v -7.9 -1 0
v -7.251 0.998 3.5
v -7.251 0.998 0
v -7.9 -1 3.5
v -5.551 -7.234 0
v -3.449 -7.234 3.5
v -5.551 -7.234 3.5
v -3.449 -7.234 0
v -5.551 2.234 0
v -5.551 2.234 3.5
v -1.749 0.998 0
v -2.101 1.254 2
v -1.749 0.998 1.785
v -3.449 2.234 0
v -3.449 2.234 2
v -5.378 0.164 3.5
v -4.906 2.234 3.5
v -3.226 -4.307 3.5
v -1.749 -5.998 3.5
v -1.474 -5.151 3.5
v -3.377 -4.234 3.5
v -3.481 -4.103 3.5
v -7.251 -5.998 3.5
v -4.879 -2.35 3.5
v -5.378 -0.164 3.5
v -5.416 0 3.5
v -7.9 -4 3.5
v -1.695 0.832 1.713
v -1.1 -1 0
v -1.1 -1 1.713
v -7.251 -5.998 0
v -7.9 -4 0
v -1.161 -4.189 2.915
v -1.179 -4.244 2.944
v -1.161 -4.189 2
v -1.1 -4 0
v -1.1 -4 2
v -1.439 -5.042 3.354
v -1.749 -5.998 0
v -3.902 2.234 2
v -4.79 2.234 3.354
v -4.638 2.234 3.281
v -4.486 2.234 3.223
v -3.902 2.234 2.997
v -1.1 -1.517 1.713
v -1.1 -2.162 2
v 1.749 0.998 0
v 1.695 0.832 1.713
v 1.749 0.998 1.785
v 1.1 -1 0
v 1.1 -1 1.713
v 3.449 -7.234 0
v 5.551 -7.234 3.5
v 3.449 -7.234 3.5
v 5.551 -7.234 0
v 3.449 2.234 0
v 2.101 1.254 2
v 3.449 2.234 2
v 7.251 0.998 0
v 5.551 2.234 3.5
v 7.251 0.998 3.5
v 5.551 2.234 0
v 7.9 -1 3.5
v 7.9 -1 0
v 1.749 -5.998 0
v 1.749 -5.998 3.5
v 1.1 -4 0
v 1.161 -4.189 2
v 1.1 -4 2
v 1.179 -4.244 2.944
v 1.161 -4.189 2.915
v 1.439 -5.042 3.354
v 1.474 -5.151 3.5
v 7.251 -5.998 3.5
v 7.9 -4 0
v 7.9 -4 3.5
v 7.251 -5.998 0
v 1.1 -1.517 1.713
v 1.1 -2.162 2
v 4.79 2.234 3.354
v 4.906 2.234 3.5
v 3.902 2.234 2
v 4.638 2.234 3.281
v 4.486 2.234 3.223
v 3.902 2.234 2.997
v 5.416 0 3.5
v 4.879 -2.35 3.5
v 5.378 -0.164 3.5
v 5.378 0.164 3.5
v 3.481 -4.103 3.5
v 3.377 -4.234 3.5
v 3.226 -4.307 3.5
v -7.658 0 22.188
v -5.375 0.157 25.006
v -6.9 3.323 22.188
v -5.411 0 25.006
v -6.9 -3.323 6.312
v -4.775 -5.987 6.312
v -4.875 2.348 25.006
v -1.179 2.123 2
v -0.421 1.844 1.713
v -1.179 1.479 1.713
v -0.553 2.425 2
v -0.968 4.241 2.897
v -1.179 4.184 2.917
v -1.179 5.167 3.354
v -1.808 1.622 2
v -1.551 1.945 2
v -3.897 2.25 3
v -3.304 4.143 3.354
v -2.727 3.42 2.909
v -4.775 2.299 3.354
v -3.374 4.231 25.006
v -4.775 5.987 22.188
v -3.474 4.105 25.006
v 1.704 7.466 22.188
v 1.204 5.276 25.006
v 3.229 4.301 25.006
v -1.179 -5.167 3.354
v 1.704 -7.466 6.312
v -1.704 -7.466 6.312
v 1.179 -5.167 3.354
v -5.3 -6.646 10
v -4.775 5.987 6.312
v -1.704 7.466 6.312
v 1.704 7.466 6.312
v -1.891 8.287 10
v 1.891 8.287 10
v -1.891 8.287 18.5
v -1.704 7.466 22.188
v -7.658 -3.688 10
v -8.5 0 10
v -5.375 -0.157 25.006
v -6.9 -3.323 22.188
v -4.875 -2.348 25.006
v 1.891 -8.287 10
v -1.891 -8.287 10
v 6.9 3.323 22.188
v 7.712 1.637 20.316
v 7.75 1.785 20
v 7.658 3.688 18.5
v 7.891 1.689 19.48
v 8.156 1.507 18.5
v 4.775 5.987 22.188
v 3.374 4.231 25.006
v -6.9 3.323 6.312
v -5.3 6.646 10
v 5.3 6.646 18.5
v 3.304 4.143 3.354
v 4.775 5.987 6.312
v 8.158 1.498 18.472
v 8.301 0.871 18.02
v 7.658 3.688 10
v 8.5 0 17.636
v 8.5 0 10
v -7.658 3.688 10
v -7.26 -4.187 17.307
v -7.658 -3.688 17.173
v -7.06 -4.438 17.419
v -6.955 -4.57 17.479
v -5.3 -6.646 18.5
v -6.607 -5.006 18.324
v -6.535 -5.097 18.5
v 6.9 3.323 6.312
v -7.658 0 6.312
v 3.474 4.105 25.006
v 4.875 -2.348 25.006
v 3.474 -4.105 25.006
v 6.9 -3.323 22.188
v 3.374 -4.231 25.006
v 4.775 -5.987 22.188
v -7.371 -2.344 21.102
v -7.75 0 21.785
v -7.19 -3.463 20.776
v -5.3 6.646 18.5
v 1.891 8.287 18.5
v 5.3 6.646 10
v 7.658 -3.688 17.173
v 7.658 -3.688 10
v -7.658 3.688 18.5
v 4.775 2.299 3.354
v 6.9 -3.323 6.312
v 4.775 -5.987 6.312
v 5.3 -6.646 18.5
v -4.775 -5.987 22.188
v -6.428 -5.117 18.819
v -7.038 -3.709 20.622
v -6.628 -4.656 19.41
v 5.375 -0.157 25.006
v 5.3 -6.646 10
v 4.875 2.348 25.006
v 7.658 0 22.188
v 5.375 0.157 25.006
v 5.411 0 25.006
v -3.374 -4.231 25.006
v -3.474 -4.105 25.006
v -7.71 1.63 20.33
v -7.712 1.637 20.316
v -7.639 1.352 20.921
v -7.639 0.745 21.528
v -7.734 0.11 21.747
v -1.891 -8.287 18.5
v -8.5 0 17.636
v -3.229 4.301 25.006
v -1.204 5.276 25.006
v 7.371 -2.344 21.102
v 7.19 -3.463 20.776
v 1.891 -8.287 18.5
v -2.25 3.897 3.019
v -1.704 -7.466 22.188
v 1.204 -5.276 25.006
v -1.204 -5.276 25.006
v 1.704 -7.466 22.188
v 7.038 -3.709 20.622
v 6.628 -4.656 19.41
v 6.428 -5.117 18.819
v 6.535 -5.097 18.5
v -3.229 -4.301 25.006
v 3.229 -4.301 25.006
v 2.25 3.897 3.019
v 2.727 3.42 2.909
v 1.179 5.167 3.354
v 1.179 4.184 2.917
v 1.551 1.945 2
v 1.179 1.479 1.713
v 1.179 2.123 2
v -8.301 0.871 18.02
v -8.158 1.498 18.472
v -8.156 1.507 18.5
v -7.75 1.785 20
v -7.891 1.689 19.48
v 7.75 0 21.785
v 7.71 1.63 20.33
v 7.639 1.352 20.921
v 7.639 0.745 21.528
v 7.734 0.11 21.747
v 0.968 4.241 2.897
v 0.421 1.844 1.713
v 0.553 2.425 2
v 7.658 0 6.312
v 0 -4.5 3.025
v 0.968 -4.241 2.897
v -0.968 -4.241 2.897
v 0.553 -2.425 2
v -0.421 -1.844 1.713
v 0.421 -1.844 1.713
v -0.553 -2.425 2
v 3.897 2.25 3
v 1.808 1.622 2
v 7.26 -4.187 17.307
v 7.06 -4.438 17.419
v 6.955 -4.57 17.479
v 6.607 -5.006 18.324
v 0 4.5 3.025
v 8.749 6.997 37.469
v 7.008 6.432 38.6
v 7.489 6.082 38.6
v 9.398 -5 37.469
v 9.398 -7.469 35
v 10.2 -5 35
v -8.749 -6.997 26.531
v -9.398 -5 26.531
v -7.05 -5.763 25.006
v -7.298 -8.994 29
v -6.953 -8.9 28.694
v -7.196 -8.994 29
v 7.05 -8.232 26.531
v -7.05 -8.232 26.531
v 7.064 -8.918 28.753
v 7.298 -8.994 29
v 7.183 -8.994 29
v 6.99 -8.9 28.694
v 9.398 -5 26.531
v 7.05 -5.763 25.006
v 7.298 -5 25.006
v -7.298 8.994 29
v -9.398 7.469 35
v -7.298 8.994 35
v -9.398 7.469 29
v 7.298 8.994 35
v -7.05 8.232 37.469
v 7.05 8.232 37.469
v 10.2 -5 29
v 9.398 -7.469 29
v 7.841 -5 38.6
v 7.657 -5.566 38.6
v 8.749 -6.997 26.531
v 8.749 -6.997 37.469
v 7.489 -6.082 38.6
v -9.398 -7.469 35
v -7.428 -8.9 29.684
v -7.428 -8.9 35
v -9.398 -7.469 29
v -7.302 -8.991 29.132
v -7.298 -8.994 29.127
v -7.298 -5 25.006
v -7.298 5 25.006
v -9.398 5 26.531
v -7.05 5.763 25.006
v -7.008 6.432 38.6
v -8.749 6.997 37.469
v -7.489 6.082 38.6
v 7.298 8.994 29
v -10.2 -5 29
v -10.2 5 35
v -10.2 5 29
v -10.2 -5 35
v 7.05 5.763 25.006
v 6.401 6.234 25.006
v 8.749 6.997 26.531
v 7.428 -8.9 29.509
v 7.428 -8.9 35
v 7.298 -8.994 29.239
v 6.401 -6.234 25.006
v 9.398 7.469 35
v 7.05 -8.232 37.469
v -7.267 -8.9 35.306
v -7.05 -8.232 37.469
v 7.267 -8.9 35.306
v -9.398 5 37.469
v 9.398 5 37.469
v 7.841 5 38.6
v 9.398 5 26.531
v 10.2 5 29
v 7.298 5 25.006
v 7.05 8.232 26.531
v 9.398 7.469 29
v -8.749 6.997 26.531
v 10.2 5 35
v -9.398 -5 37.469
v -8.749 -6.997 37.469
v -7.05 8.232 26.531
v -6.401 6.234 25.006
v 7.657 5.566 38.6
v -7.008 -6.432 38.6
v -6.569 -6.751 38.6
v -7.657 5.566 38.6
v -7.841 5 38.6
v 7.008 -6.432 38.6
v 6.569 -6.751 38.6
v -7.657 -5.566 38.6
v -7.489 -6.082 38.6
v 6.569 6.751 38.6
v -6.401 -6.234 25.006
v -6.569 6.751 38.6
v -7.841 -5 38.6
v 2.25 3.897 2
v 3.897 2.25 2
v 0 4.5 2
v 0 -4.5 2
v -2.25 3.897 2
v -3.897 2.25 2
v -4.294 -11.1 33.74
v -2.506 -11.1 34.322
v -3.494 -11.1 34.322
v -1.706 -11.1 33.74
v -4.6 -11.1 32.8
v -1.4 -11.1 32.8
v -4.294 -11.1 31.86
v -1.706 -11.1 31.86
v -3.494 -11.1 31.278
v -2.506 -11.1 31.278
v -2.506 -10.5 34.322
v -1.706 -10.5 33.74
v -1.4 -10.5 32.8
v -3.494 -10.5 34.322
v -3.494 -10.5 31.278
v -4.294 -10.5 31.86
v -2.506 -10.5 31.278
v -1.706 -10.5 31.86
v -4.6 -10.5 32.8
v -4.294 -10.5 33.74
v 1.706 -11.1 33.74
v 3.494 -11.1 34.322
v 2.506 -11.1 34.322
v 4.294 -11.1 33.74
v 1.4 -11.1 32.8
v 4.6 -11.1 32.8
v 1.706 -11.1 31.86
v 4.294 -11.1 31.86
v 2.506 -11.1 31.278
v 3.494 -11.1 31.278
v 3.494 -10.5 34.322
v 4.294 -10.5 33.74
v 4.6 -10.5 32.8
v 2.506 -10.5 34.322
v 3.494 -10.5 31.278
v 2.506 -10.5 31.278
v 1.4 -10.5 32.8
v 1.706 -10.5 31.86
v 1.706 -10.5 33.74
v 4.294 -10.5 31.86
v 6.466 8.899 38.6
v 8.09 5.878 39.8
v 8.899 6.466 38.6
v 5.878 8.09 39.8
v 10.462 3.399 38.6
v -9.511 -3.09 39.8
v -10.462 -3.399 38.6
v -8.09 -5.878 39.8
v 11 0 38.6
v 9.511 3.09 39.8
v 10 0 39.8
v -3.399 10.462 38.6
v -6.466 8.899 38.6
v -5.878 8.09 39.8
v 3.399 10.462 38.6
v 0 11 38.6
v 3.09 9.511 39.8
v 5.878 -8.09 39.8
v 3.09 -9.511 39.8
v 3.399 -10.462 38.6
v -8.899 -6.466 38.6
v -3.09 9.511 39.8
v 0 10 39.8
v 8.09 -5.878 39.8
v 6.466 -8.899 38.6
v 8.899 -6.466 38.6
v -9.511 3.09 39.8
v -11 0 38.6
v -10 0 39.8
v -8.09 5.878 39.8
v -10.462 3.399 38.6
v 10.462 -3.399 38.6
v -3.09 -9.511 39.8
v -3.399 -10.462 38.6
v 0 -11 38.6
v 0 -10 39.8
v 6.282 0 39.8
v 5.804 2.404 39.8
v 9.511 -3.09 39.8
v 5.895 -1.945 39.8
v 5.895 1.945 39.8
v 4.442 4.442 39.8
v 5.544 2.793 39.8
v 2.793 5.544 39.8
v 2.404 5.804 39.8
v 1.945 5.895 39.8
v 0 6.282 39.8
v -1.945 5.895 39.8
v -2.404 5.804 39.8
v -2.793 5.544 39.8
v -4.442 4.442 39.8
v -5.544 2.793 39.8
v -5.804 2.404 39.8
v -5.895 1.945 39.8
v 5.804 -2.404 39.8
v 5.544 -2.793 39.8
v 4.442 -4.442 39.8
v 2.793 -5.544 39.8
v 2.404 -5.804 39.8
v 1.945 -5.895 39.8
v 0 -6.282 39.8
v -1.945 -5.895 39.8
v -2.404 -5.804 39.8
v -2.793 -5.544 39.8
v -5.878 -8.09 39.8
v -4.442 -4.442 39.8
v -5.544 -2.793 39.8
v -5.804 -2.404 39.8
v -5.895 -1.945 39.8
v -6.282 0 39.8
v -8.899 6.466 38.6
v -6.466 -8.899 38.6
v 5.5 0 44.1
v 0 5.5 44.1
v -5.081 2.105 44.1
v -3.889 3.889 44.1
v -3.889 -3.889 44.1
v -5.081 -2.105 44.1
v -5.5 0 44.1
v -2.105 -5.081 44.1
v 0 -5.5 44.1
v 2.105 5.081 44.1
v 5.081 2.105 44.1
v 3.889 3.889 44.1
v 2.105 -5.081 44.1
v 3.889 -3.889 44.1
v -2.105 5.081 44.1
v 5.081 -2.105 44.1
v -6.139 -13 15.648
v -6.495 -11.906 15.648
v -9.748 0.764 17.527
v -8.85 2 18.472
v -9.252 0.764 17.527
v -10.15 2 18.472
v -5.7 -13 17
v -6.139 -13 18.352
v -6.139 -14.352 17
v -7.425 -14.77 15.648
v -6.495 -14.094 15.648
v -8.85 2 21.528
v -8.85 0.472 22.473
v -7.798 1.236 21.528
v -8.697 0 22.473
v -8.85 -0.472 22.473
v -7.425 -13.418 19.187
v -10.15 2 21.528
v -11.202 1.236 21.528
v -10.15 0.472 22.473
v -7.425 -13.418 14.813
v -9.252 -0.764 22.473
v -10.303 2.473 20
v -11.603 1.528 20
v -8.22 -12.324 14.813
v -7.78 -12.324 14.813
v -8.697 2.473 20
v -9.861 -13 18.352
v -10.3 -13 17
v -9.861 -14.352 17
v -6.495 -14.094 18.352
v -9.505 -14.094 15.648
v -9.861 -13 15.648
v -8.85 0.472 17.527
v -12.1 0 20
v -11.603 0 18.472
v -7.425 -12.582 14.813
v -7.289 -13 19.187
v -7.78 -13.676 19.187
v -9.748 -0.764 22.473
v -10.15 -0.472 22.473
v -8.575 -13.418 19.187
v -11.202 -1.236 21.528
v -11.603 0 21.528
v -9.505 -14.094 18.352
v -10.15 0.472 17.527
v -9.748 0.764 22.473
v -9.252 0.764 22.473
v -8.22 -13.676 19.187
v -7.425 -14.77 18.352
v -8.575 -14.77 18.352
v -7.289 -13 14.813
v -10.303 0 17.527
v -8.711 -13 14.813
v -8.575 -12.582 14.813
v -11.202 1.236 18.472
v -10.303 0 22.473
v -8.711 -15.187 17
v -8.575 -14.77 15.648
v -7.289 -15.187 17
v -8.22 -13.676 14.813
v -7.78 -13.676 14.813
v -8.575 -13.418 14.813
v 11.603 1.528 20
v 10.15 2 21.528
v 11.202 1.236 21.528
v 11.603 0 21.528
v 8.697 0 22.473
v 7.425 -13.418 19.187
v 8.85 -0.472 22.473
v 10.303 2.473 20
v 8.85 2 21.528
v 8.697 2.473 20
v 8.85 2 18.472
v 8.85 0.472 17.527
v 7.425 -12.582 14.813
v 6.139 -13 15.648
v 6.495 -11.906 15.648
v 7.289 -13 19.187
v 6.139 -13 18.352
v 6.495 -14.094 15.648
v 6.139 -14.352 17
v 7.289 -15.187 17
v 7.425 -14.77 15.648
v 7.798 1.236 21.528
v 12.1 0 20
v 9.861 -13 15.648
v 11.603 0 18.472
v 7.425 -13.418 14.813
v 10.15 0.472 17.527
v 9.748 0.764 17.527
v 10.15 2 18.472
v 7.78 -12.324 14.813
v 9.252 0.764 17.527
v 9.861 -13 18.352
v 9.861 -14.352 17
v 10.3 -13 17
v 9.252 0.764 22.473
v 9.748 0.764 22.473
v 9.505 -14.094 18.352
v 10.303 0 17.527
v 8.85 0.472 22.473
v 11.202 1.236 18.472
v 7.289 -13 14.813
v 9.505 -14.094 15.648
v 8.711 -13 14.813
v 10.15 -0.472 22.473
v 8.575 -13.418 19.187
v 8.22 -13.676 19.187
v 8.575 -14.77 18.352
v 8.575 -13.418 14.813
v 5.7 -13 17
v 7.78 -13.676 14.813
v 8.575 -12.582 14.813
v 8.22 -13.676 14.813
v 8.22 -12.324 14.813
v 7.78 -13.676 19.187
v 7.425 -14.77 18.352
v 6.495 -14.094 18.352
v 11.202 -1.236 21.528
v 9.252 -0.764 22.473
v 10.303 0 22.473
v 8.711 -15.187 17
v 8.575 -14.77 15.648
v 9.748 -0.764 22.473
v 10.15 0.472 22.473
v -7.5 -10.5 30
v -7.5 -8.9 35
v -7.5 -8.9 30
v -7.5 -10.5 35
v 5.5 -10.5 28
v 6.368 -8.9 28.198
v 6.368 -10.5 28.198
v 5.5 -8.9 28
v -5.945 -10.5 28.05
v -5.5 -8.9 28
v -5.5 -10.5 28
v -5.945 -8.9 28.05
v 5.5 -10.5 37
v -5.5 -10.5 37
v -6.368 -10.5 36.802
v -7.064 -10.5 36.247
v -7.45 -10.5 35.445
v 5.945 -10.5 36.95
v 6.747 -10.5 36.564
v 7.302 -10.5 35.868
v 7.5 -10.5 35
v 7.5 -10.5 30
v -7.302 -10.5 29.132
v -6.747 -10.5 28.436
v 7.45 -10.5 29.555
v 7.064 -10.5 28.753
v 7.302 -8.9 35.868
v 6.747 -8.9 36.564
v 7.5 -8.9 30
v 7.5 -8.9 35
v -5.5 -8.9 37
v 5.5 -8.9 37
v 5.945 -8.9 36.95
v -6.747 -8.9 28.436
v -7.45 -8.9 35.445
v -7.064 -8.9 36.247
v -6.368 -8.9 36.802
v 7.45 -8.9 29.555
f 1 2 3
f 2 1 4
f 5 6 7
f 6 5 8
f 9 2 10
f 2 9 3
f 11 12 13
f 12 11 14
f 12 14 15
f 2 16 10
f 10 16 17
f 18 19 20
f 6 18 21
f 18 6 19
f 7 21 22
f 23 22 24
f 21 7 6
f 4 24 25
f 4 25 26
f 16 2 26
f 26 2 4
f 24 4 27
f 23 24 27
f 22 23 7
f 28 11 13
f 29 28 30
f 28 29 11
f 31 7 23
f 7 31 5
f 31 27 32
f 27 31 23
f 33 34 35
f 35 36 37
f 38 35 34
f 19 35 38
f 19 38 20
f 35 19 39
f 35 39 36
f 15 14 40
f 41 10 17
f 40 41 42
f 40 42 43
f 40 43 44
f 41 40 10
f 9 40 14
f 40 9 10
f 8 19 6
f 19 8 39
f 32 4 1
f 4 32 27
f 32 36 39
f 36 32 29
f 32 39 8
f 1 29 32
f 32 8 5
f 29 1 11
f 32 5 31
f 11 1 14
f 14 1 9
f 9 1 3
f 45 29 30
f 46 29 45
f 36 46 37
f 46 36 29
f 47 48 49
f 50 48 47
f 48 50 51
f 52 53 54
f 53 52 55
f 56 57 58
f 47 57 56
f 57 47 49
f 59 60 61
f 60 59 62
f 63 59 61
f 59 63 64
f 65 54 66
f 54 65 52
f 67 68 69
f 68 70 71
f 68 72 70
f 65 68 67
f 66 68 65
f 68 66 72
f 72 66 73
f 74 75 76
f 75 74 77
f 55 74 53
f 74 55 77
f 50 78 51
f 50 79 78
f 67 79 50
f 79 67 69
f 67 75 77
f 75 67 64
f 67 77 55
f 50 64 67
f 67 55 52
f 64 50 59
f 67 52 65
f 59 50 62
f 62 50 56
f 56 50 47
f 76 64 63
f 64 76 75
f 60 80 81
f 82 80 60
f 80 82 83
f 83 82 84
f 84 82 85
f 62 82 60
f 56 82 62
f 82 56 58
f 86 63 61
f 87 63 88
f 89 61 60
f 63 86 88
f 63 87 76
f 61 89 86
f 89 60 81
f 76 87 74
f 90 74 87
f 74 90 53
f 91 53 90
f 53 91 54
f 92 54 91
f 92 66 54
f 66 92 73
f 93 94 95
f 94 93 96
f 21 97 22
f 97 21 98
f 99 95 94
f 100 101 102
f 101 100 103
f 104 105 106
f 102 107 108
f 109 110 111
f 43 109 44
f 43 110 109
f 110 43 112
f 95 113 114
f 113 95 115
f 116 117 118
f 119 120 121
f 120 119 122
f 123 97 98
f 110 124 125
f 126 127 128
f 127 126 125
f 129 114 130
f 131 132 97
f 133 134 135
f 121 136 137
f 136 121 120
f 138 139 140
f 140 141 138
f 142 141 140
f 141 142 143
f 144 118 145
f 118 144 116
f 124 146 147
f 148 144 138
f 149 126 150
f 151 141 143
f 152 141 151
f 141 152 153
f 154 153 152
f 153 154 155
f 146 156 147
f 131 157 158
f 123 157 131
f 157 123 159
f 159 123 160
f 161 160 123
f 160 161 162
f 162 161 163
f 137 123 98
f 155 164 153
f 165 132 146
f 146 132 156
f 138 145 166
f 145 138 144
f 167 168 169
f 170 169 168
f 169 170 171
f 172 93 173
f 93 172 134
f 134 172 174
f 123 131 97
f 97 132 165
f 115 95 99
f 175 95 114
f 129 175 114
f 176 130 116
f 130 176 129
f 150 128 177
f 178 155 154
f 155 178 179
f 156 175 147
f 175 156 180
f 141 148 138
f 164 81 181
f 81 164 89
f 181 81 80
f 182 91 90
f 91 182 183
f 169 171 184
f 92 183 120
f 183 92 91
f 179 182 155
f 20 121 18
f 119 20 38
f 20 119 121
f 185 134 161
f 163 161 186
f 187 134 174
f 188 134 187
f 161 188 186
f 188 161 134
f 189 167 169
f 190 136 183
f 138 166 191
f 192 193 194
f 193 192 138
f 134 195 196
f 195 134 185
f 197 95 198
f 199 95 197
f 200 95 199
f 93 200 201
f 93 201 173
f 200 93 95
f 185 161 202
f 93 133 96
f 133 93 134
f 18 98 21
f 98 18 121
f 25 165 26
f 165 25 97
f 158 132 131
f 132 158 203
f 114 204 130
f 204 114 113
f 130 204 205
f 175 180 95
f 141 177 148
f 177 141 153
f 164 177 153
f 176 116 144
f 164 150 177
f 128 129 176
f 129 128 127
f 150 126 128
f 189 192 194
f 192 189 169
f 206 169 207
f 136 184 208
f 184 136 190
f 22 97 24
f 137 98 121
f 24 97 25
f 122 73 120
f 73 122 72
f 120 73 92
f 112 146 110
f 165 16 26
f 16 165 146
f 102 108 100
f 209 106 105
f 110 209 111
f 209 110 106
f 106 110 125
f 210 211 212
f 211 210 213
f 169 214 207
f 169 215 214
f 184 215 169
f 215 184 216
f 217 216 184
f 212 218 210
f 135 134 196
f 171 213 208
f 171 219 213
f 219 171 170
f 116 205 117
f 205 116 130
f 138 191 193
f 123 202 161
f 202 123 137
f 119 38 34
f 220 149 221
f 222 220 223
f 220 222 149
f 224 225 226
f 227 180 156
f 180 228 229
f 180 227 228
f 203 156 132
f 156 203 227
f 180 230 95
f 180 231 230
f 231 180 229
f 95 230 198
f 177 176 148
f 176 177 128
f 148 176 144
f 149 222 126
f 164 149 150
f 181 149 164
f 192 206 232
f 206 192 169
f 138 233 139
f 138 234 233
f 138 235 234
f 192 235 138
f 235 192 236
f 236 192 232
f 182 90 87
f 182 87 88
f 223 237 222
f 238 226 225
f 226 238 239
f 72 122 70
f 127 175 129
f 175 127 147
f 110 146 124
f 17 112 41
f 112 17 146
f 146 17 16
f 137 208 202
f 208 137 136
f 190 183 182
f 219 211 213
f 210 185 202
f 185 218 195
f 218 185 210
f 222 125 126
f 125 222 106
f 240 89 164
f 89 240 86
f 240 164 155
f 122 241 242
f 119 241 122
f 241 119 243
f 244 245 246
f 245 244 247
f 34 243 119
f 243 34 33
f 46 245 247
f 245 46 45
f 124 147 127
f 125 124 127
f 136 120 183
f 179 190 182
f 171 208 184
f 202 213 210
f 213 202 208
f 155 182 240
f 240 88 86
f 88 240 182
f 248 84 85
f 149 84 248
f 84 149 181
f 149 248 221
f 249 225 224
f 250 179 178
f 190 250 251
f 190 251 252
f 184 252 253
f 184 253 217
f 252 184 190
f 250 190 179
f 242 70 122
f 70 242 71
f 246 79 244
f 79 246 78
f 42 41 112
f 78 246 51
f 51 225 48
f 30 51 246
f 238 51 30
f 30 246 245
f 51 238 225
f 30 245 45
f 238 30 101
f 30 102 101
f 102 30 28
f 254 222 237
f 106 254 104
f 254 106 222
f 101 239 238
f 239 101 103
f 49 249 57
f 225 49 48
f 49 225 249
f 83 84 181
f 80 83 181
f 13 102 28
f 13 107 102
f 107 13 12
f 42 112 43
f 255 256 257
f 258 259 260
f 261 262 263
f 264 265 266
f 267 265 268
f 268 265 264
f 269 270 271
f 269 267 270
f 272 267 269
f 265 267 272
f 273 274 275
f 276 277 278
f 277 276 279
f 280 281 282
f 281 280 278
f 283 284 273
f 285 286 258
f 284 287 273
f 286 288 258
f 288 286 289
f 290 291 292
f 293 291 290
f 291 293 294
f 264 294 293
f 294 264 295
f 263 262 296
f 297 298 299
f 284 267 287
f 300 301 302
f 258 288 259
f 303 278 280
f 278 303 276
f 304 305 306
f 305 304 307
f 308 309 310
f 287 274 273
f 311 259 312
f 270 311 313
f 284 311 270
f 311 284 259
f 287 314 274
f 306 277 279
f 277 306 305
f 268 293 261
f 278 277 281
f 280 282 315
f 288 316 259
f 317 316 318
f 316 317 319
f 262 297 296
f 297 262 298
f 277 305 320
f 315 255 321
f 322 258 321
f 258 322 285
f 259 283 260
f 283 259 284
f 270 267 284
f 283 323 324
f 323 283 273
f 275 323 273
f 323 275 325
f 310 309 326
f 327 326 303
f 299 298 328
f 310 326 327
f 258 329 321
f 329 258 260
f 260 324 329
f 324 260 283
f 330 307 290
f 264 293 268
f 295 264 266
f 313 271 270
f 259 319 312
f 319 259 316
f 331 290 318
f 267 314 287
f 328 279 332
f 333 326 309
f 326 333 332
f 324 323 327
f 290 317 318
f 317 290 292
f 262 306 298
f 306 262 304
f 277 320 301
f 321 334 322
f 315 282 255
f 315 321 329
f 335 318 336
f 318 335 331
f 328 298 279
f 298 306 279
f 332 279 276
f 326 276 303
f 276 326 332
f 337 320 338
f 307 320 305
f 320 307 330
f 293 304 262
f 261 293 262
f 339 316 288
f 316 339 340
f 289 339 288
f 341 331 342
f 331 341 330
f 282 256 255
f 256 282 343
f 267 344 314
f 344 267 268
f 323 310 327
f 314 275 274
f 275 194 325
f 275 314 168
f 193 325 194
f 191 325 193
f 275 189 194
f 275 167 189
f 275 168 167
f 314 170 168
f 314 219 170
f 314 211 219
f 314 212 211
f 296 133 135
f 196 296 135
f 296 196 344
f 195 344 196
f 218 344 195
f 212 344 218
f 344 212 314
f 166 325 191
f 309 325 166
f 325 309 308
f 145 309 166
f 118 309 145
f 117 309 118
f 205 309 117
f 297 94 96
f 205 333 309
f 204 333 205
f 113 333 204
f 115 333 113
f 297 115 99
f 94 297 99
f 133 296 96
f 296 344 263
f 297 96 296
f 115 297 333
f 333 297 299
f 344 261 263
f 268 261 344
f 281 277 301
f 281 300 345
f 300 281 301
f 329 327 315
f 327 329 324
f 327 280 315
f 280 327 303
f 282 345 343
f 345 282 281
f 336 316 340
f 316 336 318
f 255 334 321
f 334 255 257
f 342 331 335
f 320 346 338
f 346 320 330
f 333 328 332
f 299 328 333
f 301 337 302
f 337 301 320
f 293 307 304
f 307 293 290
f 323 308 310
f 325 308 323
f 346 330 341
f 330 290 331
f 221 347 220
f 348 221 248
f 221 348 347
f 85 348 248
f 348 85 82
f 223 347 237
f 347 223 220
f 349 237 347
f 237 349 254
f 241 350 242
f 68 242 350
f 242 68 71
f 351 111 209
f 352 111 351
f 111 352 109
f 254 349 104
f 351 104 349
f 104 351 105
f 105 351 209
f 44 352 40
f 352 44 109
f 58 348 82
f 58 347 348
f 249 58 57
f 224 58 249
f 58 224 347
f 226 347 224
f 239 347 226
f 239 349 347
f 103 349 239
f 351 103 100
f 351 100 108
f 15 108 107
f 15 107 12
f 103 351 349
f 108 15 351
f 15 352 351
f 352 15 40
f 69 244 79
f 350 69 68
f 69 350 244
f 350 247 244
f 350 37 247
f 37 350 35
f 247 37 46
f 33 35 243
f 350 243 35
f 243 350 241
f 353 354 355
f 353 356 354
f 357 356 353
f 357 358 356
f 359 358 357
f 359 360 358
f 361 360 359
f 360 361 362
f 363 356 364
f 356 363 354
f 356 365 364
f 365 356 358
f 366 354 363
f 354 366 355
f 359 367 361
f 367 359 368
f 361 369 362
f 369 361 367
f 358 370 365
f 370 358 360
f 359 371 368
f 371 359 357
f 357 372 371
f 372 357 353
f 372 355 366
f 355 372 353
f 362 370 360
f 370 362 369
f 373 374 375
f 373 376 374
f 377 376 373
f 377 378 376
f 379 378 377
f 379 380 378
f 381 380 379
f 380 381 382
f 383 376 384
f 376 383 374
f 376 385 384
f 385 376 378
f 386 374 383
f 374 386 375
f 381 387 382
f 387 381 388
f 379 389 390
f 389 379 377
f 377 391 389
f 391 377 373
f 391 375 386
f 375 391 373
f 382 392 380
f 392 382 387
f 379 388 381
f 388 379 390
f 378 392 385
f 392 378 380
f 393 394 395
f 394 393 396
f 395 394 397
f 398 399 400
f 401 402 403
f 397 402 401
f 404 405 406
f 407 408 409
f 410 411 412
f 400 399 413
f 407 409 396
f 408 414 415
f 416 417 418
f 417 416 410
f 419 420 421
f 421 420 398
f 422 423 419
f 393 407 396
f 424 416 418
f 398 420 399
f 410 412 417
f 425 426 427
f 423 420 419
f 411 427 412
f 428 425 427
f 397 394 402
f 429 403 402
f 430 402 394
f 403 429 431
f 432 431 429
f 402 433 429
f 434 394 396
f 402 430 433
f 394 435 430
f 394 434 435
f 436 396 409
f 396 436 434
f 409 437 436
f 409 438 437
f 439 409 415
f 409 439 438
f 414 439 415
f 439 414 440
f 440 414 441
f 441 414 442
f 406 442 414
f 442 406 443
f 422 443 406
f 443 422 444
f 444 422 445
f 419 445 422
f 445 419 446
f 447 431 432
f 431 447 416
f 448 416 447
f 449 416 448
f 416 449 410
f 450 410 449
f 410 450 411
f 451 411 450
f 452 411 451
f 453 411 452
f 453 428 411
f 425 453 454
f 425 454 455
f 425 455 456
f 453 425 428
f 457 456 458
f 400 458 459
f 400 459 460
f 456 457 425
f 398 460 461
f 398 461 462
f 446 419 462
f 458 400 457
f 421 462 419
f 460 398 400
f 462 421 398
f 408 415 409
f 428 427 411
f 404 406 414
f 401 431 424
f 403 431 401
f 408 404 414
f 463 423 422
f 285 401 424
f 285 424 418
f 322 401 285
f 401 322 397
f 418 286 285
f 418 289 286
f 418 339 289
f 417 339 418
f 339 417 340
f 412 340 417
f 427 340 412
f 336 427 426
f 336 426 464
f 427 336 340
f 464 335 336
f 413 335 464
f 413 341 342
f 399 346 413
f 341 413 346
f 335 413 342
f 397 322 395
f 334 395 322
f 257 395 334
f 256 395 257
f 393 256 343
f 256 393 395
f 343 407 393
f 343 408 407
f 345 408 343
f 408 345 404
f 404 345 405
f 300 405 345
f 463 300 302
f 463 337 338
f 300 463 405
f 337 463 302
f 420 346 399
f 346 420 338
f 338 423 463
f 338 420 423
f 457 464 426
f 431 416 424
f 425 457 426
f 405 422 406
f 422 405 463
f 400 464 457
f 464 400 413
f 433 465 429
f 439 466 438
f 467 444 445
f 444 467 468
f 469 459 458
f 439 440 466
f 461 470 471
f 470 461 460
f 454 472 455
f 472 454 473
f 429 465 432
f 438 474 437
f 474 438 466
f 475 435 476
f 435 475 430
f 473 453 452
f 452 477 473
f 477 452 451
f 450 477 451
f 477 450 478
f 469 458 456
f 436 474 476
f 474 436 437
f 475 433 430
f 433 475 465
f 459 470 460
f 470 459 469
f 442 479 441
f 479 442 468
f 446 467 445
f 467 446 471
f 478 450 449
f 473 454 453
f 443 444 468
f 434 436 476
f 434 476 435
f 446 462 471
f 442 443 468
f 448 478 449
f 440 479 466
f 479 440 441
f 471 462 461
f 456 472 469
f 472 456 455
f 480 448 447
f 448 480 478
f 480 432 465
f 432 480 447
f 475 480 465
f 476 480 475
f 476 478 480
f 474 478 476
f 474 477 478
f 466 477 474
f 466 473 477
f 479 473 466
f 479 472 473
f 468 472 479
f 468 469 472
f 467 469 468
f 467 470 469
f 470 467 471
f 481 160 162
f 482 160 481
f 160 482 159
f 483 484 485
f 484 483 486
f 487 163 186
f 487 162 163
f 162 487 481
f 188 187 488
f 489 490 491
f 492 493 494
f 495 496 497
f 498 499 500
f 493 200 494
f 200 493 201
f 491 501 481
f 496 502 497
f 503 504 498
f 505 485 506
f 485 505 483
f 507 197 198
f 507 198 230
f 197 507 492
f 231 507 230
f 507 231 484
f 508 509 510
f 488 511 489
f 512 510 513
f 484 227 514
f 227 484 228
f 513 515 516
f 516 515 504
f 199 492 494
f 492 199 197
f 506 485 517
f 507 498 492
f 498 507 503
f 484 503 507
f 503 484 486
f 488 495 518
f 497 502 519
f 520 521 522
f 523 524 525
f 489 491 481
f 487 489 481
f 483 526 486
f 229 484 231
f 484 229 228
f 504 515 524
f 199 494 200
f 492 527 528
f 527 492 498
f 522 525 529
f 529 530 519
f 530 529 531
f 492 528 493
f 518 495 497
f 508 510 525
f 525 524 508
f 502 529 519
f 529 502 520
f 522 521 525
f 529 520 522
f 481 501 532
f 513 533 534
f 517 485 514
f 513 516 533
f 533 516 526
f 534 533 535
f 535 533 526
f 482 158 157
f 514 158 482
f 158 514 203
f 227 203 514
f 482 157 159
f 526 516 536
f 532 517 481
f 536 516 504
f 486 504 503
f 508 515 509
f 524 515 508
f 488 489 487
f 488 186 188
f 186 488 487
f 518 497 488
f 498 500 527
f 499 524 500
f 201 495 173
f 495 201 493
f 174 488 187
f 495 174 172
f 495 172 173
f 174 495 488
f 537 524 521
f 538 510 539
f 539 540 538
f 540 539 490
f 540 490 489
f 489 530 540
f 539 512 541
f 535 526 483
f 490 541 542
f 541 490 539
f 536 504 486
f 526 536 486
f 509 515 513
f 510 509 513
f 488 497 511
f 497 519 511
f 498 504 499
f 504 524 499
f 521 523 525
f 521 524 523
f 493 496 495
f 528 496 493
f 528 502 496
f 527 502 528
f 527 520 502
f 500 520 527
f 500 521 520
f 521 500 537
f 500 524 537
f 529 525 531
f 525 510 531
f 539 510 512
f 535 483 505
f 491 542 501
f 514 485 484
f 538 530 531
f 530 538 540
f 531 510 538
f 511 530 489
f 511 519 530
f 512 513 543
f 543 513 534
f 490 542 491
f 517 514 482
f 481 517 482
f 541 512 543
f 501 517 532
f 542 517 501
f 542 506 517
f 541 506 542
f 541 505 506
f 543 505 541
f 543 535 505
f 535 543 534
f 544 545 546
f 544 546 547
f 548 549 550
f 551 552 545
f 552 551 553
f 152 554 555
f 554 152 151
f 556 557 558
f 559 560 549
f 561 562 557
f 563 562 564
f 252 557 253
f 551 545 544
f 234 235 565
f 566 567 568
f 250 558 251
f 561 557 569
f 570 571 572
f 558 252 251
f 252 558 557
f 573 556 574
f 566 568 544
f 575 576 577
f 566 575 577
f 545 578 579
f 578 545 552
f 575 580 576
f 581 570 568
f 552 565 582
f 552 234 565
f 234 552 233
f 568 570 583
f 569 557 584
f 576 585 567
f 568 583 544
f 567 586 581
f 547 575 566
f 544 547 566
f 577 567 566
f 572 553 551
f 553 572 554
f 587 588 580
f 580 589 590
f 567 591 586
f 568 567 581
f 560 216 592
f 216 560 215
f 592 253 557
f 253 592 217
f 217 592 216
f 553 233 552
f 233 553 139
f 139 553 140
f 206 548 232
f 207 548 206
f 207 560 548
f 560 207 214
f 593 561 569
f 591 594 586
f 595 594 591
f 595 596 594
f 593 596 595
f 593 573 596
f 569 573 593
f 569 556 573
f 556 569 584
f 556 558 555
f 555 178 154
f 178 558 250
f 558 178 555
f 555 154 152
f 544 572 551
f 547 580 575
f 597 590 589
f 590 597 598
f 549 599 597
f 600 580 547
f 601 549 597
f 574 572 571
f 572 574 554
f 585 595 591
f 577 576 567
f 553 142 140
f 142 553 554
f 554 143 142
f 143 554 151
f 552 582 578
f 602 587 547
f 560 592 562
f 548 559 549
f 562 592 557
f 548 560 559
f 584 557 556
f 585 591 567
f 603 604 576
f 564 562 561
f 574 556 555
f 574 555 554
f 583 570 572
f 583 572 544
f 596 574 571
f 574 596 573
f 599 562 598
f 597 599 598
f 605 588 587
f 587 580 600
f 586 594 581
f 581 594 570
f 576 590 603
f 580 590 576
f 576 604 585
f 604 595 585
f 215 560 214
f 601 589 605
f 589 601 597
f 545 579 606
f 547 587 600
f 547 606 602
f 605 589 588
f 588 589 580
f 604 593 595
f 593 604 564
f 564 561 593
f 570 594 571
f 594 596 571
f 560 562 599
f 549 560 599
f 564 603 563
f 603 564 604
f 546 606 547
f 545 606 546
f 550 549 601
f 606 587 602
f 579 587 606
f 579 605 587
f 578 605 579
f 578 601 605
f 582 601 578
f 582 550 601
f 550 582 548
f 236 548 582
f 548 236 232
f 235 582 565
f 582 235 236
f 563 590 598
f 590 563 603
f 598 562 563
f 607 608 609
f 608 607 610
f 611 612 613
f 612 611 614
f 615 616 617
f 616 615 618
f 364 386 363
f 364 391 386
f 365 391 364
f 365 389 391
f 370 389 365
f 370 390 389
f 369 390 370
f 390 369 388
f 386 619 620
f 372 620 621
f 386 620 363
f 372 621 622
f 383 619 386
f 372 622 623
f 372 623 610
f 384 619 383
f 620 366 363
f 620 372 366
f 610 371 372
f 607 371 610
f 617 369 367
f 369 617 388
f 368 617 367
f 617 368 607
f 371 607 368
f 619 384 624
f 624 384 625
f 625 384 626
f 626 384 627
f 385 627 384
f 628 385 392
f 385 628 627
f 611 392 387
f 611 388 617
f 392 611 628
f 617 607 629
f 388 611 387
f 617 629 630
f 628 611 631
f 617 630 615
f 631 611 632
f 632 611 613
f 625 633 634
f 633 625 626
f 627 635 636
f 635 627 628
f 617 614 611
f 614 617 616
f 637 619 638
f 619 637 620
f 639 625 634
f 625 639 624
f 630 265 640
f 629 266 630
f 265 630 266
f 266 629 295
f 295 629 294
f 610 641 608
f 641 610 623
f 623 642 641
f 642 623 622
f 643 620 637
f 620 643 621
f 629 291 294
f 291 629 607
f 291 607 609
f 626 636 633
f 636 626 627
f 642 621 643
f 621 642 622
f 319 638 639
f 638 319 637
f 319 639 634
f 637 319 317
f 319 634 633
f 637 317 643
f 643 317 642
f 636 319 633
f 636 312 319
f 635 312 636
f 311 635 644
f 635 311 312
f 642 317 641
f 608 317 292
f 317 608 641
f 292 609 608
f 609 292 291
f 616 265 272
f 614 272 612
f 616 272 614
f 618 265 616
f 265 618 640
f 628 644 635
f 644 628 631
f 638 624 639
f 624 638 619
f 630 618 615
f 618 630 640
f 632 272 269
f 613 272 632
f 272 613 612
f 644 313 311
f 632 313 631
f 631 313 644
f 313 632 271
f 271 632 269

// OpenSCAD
// Kiuê — robozinho articulado (tema fazenda), v1.
// Família dos robôs dos guichês e da função sob demanda: corpo de cápsula, cabeça arredondada com
// visor escuro e dois olhos acesos, chapéu de palha. Escala 1 = 40 mm de altura (sem o chapéu);
// o jogo amplia/encolhe por instância.
// Convenções: Z para cima; frente em −Y (no jogo vira +z, de frente para a câmera); origem no chão,
// entre os pés. Os braços saem com a origem no ombro (exporta = true) para o jogo girá-los em x.
// Partes: corpo (branco), visor (escuro), olhos (acesos), chapeu (palha), bracos (branco, articulado).

parte = "tudo";
exporta = false;
PARTES = ["corpo", "visor", "olhos", "chapeu", "bracos"];
$fn = 14;

SHOULDER = [0, 0, 20];

module corpo() {
    hull() { translate([0, 0, 10]) sphere(r = 8.5); translate([0, 0, 18.5]) sphere(r = 8.5); }
    hull() for (sx = [-1, 1], sy = [-1, 1], sz = [0, 1]) translate([sx * 6, sy * 5, 29 + sz * 6]) sphere(r = 4.2, $fn = 10);
    // pés (afundam 0,3 no corpo)
    for (s = [-1, 1]) translate([s * 4.5, -1, 0]) hull() { cylinder(r = 3.4, h = 3.5, $fn = 10); translate([0, -3, 0]) cylinder(r = 3.4, h = 3.5, $fn = 10); }
    translate([0, 0, 2]) cylinder(r = 4.5, h = 4.3, $fn = 12);
}
module visor() translate([0, -8.9, 32.5]) rotate([90, 0, 0]) linear_extrude(1.6) offset(r = 2) square([11, 5], center = true);
module olhos() for (s = [-1, 1]) translate([s * 3, -10.2, 32.8]) rotate([90, 0, 0]) cylinder(r = 1.6, h = 0.9, $fn = 10);
module chapeu() translate([0, 0, 38.6]) { cylinder(r1 = 11, r2 = 10, h = 1.2, $fn = 20); cylinder(r1 = 6.5, r2 = 5.5, h = 5.5, $fn = 16); }
// braços para a frente, um pouco abaixados (pose base); o jogo gira em torno do ombro
module bracos() for (s = [-1, 1]) hull() { translate([s * 9.5, 0, 0]) sphere(r = 2.6, $fn = 10); translate([s * 8, -13, -3]) sphere(r = 2.3, $fn = 10); }

module peca(n) {
    if (n == "corpo") corpo(); else if (n == "visor") visor(); else if (n == "olhos") olhos();
    else if (n == "chapeu") chapeu(); else if (n == "bracos") translate(SHOULDER) bracos();
}
if (parte == "tudo") { union() for (p = PARTES) peca(p); }
else if (exporta && parte == "bracos") bracos();
else peca(parte);
